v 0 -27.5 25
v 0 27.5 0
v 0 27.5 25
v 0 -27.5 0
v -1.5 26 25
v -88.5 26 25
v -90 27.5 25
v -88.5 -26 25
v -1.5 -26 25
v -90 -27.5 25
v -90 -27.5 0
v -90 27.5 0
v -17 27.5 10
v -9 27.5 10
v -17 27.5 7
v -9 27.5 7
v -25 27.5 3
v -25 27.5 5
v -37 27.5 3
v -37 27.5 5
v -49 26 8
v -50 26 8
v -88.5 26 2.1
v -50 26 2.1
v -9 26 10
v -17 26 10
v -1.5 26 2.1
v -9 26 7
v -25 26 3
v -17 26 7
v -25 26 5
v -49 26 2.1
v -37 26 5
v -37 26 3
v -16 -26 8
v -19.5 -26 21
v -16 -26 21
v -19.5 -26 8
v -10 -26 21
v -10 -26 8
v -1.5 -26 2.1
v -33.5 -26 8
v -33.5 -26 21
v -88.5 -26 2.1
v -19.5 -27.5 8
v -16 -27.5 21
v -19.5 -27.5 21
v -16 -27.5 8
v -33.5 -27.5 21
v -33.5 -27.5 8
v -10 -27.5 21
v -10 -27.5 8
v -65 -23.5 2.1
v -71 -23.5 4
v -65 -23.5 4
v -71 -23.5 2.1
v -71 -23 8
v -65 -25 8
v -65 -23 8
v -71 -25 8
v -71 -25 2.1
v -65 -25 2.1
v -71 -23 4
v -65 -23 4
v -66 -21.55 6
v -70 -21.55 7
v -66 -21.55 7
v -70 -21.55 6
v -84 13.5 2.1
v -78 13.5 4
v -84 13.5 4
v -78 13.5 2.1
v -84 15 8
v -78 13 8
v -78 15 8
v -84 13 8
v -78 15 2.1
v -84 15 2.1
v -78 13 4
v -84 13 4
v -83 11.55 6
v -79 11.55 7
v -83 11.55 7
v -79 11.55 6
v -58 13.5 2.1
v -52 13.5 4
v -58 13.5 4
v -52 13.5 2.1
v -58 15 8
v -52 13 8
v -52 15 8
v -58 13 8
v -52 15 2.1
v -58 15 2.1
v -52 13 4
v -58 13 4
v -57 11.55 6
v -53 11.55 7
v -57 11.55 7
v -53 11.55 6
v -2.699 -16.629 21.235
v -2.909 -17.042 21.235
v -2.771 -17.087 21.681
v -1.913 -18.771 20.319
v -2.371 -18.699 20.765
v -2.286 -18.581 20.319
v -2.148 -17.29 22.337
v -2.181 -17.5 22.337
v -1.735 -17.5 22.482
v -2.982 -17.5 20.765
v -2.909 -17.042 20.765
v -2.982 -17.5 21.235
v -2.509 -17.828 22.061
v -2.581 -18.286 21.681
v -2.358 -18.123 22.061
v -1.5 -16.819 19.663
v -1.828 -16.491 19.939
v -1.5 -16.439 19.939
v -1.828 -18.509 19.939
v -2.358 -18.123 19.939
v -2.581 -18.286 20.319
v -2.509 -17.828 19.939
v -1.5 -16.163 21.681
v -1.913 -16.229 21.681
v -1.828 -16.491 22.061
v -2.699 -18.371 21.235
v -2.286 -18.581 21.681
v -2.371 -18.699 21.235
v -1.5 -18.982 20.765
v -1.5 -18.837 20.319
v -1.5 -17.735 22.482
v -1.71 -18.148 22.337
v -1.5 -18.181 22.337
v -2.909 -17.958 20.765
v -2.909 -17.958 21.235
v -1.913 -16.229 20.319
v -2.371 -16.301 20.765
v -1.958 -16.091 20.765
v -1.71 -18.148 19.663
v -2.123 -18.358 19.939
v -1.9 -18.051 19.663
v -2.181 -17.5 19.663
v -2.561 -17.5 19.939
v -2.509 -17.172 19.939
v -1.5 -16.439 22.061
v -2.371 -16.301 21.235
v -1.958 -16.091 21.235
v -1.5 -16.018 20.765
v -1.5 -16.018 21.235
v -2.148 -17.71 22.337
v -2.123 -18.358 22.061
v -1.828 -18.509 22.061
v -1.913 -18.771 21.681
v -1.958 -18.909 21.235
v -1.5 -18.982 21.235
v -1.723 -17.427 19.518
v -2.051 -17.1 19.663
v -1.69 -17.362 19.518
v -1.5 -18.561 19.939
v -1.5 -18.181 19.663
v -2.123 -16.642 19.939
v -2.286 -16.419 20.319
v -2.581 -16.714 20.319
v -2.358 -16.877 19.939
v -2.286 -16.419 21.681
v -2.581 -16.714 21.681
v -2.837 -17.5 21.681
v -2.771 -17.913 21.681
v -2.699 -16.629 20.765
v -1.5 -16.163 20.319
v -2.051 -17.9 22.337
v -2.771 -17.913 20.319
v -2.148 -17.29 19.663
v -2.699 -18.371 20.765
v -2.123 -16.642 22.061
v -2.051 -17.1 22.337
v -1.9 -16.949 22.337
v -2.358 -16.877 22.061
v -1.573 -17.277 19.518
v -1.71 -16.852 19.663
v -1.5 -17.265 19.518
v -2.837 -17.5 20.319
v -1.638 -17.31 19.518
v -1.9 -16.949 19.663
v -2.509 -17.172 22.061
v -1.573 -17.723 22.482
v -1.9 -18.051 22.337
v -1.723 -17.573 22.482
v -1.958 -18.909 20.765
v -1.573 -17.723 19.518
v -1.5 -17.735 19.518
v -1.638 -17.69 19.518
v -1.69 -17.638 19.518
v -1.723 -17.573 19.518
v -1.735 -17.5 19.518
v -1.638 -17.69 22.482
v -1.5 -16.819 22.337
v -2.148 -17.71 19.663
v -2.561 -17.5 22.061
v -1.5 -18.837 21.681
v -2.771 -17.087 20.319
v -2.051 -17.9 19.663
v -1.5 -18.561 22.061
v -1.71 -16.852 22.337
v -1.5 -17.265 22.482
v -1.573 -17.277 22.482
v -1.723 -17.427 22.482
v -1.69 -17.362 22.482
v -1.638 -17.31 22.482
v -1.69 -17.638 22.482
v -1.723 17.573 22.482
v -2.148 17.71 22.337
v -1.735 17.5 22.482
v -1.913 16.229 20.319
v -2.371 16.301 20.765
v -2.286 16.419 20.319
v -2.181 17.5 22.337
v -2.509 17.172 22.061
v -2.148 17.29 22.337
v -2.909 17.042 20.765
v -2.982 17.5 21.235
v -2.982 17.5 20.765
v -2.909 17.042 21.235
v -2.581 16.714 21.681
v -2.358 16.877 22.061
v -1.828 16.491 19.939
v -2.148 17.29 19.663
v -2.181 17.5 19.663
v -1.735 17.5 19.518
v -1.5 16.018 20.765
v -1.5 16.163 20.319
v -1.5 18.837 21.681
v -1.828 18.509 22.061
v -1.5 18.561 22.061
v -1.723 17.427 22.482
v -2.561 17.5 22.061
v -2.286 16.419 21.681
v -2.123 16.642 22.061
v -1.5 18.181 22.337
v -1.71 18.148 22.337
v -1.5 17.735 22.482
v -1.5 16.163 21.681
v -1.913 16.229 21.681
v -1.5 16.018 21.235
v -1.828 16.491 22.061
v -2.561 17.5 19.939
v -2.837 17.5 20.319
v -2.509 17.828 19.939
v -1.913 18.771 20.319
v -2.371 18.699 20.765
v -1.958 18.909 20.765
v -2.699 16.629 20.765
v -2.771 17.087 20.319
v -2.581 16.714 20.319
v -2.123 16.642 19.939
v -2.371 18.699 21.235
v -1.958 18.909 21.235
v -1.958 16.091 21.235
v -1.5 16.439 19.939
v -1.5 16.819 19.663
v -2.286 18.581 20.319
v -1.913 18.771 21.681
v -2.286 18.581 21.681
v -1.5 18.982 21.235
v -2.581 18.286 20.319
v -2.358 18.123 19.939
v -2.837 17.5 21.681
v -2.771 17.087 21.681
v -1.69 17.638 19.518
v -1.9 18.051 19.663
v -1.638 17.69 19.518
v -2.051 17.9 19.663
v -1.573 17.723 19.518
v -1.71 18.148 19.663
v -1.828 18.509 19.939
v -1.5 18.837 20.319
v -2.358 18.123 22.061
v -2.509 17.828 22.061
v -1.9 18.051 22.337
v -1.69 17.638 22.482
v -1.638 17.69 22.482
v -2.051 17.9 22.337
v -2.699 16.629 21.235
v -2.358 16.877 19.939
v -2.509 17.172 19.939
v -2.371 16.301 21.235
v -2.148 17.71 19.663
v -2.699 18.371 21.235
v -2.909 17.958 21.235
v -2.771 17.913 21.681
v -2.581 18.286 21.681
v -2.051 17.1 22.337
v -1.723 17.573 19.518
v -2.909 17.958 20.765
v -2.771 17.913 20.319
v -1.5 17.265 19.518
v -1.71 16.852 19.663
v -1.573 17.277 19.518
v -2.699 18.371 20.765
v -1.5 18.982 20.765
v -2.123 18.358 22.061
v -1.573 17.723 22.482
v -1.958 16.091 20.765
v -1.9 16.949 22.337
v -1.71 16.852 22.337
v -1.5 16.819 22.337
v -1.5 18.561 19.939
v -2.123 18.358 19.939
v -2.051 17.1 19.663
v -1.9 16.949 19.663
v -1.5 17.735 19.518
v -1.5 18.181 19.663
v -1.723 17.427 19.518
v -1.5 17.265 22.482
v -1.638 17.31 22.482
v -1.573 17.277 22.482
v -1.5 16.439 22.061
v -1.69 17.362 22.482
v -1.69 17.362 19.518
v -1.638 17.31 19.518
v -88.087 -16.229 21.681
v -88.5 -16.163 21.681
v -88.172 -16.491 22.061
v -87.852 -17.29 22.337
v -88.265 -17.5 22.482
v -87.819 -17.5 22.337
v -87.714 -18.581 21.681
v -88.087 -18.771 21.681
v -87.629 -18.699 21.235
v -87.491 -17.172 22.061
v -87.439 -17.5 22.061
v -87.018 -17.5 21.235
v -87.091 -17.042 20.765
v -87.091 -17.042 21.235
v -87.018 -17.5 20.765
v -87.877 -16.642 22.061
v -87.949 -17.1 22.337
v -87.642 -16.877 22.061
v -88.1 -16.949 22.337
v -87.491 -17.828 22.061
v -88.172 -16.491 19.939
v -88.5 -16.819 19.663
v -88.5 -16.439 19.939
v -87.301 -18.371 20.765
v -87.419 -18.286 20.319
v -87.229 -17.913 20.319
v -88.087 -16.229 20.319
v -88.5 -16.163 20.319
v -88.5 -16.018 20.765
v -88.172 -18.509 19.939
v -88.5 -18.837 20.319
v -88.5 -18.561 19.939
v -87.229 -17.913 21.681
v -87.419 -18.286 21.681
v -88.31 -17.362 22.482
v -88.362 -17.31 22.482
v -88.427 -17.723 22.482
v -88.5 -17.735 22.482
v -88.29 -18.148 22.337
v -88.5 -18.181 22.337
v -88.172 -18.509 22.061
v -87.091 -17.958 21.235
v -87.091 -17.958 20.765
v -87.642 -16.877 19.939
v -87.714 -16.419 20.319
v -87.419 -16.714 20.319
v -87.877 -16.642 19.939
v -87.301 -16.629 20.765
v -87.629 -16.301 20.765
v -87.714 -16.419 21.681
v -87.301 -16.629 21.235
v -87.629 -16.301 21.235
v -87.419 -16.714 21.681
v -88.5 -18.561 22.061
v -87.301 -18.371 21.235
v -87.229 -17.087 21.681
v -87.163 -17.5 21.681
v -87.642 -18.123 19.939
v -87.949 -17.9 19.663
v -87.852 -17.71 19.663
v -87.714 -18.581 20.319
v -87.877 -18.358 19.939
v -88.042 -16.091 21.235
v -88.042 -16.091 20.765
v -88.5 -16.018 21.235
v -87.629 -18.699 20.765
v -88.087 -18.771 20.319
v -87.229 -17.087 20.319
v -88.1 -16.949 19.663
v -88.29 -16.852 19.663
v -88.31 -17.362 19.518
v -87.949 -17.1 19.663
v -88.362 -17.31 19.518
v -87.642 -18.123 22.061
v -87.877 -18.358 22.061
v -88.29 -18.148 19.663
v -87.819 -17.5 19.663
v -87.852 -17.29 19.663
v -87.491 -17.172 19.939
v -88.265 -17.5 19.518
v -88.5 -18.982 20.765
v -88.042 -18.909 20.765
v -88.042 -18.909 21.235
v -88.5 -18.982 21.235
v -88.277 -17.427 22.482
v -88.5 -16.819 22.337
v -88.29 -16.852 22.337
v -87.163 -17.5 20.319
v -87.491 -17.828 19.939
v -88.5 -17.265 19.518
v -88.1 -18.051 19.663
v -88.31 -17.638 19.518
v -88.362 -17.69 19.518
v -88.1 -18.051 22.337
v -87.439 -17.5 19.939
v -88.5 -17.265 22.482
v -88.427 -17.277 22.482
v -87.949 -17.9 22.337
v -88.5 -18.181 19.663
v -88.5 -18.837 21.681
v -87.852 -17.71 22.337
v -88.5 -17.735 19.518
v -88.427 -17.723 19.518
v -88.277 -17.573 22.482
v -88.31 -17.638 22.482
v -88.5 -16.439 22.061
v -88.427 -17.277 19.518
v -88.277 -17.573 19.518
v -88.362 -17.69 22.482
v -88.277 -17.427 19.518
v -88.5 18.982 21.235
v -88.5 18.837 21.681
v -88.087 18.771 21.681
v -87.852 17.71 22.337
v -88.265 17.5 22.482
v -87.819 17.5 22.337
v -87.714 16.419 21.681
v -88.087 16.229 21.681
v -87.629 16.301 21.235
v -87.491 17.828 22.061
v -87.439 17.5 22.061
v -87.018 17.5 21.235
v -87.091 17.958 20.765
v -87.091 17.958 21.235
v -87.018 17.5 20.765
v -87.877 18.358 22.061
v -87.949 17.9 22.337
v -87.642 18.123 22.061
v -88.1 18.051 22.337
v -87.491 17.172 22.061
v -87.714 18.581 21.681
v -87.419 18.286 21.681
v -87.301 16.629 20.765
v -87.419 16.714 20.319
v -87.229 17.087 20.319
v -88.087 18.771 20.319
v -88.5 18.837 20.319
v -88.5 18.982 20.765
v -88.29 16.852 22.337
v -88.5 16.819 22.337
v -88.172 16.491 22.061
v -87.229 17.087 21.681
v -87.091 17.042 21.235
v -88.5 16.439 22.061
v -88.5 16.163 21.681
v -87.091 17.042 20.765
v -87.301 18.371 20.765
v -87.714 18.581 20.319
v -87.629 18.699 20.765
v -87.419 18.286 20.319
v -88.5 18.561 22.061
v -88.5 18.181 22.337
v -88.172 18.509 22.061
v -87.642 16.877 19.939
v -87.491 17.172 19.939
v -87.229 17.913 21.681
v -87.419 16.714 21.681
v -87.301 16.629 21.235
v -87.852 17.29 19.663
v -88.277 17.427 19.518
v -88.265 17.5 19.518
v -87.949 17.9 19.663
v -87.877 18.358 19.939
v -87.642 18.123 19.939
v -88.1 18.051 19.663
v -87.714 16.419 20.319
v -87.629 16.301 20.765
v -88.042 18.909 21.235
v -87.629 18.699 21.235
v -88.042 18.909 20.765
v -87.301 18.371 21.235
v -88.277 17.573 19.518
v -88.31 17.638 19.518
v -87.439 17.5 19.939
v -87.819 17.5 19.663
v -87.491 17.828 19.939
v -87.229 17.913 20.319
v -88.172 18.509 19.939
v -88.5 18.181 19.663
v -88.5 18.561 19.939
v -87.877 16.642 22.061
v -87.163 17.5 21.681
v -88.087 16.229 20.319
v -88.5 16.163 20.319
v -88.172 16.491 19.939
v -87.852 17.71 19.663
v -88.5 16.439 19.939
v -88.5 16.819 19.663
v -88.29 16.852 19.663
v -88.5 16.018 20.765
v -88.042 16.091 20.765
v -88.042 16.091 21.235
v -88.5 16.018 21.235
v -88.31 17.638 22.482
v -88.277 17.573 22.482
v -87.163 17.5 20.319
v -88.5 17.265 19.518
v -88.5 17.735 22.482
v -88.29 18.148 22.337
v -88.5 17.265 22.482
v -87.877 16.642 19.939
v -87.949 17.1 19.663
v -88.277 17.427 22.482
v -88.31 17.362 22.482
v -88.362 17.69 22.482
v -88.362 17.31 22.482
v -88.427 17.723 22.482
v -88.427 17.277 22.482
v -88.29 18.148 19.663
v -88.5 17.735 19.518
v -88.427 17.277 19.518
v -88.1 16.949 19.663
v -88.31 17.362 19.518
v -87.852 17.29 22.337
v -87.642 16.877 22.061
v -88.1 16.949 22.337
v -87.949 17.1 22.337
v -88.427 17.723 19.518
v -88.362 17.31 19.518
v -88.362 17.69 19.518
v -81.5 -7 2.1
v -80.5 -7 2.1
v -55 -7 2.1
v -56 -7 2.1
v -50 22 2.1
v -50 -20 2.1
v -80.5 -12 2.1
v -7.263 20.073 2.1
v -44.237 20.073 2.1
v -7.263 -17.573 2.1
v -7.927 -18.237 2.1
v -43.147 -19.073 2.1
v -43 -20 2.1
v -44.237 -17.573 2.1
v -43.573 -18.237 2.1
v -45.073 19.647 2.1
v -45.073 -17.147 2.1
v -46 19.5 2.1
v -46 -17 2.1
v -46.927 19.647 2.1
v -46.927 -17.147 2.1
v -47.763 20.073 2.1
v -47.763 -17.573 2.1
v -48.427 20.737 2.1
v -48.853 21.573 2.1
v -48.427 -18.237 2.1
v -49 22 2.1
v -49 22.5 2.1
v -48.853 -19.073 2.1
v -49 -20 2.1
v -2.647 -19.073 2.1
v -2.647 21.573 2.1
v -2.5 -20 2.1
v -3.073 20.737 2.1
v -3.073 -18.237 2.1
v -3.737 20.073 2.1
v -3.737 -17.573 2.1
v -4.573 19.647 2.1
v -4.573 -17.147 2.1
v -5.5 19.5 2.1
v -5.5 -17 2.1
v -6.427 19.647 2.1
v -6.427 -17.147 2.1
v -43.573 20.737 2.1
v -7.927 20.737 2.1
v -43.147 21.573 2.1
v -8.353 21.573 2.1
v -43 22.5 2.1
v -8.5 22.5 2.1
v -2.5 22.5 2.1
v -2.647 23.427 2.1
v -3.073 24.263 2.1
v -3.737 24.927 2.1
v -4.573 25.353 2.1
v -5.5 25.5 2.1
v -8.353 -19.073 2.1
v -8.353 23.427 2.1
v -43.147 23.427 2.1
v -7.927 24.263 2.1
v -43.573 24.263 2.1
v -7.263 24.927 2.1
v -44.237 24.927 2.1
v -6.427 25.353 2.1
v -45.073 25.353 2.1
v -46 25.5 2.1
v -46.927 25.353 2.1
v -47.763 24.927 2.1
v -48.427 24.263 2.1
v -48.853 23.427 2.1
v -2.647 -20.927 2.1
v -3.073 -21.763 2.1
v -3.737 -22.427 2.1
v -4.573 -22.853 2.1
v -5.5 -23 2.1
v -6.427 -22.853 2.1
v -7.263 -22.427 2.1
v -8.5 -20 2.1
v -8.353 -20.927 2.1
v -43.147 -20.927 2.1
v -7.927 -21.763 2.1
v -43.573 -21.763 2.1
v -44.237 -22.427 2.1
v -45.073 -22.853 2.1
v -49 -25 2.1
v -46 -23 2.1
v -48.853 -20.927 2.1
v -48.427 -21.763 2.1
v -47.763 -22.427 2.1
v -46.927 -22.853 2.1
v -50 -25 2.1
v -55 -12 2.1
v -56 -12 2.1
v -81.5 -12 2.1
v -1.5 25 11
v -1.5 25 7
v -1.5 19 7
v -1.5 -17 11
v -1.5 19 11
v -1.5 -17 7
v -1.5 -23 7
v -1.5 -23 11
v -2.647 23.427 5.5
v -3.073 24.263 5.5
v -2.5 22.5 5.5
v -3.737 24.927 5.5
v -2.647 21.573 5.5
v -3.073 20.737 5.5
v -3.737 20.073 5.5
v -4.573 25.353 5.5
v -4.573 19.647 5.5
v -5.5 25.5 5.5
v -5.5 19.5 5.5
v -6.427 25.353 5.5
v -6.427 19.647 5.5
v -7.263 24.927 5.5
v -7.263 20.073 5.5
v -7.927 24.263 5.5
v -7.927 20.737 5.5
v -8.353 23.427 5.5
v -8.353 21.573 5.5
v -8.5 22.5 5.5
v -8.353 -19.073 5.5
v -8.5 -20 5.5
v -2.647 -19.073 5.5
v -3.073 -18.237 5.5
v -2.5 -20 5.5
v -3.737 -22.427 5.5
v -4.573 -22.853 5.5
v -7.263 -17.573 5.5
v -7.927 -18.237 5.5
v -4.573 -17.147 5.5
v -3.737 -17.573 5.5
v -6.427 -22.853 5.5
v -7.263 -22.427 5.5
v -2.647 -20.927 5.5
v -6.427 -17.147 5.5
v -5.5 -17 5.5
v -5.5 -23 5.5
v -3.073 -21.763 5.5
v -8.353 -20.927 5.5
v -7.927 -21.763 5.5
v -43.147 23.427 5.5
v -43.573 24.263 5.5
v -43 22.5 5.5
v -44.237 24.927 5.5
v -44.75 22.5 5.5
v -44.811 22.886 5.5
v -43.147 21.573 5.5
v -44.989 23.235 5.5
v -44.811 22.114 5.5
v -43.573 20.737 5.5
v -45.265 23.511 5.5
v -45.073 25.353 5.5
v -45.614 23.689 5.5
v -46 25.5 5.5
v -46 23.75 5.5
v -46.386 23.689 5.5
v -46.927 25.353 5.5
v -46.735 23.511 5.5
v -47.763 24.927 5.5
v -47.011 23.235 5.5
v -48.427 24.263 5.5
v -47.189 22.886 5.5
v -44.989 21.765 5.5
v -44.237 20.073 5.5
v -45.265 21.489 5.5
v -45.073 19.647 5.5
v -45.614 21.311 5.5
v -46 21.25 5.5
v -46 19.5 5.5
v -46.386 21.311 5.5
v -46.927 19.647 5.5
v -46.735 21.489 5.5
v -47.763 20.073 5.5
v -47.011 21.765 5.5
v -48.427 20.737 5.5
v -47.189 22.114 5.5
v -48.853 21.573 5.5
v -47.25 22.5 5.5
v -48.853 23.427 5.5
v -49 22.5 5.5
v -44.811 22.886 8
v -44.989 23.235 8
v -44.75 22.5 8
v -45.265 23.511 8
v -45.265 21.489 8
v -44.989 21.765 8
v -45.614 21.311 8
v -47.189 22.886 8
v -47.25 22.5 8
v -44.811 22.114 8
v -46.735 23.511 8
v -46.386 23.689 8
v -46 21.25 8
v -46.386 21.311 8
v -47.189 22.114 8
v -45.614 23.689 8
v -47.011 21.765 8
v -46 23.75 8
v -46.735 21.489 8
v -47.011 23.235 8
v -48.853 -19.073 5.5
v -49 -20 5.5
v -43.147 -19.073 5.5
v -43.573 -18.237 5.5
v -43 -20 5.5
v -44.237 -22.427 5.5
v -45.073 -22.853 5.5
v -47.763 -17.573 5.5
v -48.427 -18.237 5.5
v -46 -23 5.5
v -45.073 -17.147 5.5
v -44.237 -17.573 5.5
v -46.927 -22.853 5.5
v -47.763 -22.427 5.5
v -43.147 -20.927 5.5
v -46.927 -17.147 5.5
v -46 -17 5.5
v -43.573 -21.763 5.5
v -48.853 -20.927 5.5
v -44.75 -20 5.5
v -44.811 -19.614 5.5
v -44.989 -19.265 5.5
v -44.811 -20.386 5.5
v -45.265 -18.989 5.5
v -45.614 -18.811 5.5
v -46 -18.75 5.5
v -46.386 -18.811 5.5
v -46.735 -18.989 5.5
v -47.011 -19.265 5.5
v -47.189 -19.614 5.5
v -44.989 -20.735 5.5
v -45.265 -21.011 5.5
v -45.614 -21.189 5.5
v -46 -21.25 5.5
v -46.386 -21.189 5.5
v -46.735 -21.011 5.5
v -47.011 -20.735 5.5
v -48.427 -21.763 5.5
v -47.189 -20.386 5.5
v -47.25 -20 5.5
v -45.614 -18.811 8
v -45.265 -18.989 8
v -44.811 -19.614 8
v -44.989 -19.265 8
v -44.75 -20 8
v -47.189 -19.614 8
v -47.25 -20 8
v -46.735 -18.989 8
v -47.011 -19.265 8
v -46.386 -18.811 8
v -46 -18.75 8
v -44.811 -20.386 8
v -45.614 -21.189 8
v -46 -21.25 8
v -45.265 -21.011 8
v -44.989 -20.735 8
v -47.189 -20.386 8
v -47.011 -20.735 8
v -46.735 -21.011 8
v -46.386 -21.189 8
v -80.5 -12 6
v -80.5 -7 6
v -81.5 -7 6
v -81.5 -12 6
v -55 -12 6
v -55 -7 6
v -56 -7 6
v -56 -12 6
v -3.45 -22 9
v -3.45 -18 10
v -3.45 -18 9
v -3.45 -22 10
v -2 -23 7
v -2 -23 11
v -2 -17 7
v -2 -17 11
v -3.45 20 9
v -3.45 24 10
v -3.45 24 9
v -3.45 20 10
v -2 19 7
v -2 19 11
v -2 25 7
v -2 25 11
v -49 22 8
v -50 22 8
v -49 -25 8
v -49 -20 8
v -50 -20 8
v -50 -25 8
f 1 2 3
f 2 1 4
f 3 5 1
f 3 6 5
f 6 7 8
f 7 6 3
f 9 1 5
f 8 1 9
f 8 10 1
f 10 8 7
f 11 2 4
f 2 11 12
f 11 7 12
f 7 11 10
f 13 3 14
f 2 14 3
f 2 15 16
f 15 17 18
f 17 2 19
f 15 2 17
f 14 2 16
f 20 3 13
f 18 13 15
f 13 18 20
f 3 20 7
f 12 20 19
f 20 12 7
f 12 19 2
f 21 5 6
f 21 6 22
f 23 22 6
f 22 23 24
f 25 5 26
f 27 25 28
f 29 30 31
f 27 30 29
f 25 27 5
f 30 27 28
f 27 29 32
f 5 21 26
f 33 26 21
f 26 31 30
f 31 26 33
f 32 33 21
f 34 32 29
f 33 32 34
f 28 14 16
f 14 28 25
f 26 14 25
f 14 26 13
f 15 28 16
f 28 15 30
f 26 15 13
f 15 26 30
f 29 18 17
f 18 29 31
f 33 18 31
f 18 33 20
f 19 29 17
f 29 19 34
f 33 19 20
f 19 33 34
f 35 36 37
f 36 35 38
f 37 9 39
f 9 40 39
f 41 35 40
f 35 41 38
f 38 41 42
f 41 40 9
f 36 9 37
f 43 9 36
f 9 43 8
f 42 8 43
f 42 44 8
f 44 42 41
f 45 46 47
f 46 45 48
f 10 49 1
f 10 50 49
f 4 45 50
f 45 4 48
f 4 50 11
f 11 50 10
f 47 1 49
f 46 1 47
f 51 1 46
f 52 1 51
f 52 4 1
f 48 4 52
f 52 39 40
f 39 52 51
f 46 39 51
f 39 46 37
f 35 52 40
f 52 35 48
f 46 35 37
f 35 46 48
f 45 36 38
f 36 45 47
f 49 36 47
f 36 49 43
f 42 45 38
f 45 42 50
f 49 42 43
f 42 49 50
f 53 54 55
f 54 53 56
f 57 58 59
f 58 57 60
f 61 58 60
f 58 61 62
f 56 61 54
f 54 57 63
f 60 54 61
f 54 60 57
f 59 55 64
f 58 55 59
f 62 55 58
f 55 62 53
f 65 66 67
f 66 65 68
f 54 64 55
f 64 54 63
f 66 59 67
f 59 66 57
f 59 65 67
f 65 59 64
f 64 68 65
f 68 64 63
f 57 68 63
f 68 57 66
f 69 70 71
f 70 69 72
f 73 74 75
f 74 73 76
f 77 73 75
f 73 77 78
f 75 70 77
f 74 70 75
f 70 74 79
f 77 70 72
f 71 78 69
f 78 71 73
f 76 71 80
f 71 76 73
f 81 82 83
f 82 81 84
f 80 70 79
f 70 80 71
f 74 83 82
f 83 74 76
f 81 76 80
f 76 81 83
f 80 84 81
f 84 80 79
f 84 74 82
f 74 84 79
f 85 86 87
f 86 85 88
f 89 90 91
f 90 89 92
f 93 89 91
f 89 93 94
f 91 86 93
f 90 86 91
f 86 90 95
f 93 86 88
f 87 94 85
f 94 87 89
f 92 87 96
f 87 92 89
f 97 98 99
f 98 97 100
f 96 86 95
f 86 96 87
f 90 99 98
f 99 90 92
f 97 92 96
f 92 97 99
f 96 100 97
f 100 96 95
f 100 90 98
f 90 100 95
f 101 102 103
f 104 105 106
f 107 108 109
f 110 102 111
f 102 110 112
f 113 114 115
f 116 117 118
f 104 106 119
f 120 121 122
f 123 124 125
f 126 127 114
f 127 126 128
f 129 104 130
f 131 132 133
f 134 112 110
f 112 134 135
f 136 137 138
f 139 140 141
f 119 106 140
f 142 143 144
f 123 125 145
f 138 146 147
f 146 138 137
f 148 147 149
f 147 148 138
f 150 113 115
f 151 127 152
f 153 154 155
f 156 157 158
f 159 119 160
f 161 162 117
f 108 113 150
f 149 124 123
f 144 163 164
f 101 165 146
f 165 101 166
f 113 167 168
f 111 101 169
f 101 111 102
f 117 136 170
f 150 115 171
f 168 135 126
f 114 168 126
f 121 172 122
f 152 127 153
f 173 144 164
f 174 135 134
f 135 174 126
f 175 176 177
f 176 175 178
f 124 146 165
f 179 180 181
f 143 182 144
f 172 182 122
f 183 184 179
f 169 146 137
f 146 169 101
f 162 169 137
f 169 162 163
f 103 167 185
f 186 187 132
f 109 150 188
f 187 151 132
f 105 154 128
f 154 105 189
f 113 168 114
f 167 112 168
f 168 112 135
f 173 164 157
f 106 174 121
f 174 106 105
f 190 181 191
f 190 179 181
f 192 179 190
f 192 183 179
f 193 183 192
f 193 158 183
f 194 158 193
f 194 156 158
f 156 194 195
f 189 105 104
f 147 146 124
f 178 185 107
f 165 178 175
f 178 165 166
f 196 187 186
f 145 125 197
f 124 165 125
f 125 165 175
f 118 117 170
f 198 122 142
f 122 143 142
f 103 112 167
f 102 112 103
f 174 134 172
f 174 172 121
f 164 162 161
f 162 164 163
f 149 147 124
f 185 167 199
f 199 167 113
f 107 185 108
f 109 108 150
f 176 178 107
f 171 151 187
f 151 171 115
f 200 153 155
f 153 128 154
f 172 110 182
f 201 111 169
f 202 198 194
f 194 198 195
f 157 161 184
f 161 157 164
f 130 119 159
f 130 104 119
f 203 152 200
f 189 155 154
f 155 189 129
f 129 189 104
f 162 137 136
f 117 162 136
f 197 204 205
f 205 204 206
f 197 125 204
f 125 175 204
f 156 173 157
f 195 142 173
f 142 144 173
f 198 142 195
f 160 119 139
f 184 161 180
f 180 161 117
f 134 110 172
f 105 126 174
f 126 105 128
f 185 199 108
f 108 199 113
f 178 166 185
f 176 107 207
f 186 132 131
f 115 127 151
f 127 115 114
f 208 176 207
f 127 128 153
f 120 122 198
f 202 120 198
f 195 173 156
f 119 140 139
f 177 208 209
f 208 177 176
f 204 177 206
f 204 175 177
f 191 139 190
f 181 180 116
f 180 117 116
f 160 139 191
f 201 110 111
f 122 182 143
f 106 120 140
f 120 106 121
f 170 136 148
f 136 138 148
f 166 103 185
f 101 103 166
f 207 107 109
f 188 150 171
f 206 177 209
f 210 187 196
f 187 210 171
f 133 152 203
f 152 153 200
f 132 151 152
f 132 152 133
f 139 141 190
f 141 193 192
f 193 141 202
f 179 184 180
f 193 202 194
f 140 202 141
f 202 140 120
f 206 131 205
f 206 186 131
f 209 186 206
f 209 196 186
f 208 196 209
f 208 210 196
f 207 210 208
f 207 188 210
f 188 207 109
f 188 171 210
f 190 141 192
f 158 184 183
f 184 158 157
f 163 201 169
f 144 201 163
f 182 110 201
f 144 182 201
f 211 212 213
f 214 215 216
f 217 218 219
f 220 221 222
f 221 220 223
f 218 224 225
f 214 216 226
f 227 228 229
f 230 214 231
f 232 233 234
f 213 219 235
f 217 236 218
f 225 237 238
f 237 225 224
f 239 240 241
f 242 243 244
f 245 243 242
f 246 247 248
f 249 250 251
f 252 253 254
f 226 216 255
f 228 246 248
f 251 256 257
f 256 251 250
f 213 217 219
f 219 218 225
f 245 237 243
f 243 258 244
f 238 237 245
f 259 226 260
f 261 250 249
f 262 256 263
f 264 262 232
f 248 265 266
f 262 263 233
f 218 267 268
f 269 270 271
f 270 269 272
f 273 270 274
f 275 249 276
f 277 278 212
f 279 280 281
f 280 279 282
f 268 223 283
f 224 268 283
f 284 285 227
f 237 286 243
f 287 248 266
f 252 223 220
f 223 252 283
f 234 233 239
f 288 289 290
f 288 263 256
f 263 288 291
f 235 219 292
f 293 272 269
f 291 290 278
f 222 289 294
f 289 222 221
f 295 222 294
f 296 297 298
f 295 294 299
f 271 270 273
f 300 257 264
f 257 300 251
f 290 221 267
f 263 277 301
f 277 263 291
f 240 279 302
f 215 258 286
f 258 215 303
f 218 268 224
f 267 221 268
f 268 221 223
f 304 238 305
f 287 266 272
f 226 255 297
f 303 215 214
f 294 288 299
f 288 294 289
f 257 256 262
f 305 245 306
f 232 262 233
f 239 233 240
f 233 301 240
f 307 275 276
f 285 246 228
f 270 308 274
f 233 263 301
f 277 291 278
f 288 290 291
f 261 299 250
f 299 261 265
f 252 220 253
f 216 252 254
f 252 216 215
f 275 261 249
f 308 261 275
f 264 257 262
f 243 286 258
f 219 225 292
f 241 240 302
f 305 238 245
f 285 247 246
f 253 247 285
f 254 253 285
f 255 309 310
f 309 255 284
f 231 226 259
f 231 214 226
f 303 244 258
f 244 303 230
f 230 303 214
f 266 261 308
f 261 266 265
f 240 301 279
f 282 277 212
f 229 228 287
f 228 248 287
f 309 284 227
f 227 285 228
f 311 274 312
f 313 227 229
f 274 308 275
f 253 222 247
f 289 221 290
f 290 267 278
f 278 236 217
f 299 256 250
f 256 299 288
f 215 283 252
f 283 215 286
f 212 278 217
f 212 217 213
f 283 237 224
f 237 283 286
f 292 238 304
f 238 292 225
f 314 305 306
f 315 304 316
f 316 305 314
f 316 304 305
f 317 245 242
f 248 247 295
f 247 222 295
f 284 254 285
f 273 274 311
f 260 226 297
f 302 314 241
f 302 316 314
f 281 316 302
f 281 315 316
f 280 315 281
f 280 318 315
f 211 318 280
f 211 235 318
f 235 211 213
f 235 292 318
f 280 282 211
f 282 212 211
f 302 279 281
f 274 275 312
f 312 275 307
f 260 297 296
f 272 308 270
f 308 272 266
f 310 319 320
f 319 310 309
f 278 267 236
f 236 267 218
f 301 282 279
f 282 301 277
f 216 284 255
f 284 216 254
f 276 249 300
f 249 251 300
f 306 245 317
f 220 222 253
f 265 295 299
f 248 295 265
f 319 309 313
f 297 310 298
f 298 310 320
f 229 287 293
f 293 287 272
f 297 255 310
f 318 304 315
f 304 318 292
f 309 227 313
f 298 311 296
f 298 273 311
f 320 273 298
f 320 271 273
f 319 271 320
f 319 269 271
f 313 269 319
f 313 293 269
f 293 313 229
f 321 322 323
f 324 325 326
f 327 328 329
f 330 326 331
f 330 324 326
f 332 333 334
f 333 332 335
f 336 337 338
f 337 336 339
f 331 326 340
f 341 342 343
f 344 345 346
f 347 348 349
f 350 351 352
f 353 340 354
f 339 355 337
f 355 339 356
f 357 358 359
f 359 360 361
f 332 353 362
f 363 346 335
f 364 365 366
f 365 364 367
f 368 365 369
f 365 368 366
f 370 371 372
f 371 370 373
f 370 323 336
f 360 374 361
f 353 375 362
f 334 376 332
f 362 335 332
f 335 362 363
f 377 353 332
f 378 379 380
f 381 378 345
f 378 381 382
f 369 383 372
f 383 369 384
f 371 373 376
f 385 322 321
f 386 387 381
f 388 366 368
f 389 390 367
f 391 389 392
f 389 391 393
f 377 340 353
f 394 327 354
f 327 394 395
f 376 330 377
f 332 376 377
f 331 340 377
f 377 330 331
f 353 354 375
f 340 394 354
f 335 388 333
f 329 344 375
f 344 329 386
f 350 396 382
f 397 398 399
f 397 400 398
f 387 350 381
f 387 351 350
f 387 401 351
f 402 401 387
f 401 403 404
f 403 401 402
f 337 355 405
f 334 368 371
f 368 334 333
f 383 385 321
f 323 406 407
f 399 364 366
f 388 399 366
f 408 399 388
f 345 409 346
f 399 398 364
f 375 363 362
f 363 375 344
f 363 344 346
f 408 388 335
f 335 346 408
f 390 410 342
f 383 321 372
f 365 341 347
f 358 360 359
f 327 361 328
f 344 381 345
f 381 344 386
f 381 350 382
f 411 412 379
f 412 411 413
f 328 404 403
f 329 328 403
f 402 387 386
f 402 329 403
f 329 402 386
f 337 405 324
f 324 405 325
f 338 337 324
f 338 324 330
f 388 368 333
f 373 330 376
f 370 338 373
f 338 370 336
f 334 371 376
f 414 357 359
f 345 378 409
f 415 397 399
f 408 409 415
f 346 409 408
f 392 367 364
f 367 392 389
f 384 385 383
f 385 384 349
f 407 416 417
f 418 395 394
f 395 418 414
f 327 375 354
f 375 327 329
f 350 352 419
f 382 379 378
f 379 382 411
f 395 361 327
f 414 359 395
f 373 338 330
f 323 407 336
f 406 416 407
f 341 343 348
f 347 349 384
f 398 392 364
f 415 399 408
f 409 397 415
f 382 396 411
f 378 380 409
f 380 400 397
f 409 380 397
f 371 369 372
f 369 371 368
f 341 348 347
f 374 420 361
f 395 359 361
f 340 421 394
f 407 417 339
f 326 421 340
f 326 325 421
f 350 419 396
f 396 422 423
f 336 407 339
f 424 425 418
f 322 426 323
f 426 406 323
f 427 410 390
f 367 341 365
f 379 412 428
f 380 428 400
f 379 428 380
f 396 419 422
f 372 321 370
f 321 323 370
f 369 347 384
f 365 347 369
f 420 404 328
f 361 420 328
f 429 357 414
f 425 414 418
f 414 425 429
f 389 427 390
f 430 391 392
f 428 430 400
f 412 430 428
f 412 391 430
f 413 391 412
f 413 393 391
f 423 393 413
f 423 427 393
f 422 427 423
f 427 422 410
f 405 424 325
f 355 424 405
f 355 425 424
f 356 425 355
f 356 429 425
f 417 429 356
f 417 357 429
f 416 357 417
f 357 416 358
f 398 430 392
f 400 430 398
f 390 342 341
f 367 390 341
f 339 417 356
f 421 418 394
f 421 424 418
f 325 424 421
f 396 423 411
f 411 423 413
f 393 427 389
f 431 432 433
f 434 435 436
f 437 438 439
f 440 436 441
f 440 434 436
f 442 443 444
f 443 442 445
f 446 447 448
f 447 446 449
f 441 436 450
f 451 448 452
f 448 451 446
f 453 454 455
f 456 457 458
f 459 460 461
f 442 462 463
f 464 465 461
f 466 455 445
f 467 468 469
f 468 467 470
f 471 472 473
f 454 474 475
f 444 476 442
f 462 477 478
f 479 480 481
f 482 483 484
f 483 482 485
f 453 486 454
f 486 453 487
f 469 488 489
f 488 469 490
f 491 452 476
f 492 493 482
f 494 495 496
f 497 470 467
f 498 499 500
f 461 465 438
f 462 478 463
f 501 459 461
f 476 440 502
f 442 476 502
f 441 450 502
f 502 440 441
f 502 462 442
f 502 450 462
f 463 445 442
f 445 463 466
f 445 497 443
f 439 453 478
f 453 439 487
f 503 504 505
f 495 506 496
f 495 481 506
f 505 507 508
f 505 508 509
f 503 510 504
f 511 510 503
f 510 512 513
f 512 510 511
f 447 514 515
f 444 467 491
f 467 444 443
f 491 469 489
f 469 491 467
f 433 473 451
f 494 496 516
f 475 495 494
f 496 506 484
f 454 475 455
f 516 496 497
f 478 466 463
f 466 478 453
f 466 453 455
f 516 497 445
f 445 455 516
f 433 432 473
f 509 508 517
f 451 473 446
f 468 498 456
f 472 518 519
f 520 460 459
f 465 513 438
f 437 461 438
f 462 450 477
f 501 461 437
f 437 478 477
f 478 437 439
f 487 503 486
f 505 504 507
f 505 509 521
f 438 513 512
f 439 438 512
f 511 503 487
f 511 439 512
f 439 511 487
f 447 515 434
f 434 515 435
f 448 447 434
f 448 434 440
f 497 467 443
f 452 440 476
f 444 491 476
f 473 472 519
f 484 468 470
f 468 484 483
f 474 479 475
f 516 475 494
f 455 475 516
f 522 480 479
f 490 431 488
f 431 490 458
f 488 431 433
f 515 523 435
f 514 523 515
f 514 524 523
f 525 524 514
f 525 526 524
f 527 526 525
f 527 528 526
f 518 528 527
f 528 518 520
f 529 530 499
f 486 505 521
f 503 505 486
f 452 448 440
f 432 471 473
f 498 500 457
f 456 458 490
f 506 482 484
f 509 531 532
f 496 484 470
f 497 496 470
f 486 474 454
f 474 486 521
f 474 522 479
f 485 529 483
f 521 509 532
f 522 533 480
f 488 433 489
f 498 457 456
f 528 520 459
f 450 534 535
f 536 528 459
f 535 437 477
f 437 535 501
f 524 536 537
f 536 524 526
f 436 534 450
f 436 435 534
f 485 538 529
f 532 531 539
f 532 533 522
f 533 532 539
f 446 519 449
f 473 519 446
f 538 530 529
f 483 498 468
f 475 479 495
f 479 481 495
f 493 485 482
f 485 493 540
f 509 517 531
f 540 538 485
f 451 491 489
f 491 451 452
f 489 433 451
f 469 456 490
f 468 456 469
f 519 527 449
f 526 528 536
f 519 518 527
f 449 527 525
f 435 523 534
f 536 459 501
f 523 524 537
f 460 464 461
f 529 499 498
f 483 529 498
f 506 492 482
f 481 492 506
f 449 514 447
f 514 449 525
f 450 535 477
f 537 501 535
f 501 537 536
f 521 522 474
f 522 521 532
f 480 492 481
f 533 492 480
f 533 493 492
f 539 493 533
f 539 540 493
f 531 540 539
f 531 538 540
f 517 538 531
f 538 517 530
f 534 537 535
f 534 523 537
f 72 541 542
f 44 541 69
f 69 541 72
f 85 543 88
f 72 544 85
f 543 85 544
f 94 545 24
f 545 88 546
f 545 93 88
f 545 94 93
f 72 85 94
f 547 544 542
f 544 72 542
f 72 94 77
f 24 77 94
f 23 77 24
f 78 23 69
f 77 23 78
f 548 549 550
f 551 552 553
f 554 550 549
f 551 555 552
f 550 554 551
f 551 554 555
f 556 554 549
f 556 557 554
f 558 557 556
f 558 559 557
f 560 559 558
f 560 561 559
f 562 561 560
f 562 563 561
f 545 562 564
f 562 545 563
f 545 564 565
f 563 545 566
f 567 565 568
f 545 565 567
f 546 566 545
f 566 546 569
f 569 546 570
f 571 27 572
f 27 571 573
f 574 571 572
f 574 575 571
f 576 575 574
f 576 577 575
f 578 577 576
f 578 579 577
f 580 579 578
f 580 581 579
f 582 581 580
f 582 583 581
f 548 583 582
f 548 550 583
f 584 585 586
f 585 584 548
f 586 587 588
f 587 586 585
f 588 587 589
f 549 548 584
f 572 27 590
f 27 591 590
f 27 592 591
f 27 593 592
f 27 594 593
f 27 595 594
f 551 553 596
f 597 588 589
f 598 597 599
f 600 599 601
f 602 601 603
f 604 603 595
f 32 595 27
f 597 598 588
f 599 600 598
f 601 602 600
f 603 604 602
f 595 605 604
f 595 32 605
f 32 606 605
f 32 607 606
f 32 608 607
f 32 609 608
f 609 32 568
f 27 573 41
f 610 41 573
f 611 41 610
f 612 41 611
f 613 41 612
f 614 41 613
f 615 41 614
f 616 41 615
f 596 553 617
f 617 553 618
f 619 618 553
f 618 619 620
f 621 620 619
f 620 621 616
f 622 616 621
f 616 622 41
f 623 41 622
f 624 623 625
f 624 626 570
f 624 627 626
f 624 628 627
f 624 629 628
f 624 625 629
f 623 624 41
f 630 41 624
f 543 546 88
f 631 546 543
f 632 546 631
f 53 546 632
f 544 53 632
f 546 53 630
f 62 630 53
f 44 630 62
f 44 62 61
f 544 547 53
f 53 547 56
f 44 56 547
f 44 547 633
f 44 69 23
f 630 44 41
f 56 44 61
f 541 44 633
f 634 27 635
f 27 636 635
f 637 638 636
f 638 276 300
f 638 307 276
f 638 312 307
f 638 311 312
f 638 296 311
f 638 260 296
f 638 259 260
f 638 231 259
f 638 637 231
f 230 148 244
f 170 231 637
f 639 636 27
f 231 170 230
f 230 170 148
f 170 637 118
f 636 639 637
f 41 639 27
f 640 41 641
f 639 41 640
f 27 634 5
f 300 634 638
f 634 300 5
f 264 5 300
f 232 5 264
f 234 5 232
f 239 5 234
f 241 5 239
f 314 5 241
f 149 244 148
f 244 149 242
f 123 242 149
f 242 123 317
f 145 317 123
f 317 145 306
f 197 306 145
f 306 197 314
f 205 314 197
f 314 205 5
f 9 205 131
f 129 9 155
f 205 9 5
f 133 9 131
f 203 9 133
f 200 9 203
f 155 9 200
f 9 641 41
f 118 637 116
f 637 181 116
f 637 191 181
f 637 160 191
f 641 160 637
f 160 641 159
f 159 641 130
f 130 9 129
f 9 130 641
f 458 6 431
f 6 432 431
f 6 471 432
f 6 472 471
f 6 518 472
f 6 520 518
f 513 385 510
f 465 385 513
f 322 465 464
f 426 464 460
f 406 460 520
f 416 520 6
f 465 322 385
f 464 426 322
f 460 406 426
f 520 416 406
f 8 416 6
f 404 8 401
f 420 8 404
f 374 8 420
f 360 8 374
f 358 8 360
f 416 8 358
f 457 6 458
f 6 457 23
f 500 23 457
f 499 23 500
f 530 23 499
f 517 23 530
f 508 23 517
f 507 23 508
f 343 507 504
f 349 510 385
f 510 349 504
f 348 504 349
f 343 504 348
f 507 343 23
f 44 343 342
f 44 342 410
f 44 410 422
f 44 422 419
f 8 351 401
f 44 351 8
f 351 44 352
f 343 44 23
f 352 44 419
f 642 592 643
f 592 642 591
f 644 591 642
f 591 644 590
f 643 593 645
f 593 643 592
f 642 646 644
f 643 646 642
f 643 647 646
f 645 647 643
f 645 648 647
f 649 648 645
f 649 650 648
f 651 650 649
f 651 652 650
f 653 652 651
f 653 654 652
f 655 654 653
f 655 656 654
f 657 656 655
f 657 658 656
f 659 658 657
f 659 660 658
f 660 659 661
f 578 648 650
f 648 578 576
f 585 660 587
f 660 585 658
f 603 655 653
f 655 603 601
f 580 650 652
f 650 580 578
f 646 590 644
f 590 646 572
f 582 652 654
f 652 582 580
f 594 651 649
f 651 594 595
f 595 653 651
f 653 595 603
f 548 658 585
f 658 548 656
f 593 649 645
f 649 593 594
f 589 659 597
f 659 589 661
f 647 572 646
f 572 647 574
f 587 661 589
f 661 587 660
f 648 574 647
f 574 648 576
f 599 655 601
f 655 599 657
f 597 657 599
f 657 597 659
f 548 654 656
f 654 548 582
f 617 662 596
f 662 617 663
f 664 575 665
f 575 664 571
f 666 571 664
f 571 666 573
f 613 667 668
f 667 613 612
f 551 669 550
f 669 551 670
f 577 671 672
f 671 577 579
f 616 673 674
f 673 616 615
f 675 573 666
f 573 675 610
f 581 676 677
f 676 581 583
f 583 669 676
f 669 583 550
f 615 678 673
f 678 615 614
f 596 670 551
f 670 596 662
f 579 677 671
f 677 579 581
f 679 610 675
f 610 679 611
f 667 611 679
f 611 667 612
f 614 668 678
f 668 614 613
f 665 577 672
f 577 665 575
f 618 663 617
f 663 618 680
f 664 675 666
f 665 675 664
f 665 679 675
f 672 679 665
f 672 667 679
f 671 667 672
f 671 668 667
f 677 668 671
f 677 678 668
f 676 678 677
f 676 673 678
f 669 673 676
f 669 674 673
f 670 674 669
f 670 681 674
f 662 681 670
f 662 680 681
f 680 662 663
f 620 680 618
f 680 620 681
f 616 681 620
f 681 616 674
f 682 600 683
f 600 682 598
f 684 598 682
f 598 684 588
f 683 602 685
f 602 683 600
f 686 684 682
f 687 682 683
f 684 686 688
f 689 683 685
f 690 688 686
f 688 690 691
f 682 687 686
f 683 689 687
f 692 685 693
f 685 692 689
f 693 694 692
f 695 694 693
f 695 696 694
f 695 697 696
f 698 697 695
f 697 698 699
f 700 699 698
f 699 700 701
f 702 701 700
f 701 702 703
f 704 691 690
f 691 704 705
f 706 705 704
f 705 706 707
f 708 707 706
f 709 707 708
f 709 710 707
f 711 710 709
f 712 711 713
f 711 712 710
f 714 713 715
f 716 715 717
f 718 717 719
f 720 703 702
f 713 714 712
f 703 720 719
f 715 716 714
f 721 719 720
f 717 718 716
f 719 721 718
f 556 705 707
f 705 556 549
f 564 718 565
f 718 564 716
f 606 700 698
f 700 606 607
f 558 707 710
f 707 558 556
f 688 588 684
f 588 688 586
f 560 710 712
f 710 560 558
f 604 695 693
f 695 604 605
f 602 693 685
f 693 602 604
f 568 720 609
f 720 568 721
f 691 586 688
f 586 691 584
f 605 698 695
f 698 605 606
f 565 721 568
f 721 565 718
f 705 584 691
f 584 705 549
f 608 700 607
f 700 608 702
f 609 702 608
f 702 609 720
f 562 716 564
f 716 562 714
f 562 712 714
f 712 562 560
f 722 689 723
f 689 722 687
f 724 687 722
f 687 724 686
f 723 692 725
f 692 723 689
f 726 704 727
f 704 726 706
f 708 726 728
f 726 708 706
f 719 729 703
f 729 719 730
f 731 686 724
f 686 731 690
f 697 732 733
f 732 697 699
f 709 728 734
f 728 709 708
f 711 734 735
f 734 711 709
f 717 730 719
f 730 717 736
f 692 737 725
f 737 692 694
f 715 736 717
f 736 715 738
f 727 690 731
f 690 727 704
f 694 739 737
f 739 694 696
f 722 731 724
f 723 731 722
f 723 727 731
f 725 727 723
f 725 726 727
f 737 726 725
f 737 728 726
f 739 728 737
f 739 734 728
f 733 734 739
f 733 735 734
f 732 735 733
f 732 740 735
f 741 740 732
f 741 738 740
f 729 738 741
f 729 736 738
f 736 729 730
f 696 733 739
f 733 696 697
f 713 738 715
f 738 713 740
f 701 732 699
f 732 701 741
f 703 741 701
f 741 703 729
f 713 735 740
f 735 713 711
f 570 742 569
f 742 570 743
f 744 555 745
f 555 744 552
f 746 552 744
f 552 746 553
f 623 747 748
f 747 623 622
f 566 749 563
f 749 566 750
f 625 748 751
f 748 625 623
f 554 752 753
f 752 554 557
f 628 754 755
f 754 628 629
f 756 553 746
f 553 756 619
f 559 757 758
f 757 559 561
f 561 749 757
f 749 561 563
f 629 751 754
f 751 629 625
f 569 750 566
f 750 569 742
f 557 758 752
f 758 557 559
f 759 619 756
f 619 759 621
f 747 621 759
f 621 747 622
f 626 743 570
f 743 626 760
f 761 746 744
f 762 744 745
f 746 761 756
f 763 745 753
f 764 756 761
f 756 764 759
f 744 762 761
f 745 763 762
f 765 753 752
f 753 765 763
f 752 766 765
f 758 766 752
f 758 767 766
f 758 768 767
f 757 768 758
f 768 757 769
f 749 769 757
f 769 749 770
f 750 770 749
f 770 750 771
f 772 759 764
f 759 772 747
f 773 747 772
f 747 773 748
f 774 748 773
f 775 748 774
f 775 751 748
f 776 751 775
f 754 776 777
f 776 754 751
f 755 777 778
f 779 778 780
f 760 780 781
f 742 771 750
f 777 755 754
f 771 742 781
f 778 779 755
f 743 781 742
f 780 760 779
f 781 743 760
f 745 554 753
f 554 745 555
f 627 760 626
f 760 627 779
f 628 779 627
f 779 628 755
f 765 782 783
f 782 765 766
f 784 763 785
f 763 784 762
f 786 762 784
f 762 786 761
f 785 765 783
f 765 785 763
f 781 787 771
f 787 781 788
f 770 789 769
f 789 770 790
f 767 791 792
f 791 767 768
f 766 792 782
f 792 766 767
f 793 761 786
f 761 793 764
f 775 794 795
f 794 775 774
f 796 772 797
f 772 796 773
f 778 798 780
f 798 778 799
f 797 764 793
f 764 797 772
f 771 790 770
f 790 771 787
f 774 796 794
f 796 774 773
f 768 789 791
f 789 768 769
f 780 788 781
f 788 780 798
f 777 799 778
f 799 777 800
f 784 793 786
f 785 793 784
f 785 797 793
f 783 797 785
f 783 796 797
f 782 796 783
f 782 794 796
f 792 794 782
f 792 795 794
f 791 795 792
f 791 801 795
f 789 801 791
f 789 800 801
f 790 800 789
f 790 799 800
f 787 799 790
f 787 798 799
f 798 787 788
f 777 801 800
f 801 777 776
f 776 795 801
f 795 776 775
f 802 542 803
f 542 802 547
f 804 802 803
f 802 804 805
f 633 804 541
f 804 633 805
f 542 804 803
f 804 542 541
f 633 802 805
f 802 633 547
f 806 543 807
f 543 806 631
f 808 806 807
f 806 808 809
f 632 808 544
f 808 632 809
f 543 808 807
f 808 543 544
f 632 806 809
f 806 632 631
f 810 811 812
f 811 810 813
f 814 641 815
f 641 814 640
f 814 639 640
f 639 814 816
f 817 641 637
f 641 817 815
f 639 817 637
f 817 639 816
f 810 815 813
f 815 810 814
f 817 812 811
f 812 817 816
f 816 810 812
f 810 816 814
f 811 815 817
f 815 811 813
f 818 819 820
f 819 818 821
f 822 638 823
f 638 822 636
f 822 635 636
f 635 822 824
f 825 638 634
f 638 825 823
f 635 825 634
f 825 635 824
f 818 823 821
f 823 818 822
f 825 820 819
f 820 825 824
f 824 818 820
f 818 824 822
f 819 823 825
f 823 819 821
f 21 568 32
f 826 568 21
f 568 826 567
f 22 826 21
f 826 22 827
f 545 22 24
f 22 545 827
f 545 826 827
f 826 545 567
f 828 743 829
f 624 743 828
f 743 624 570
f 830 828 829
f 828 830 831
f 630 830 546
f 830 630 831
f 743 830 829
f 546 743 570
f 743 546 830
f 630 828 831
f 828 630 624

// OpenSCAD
// Startpoint Router ground:

le=90;
br=55;
hr=25;

module usb_eth(){
    difference() {
        translate([0-le,-br/2,0])cube([le,1.5,hr]);
        translate([0-16,-br/2-0.5,8])cube([6,3,13]);        
        translate([0-14.5-19,-br/2-0.5,8])cube([14,3,13]);        
    }
 }

module usb_sdcard(){
    difference() {
        translate([0-le,br/2-1.5,0])cube([le,1.5,hr]);
        translate([0-8-9,br/2-2,7])cube([8,3,3]);        
        translate([0-12-25,br/2-2,3])cube([12,3,2]);        
    }
}

module merkur_snap() {
        cube([1.5,6,6]);
    hull(){
        translate([0,0,2])cube([2,6,4]);
        translate([1,1,4])cube([2.45,4,1]);
    }
}

module orange_snap() {
    hull(){
        translate([0,0,2])cube([2,6,4]);
        translate([1,1,4])cube([2.45,4,1]);
    }
}

module holders(){
   translate([0-1.5,-br/2+10,hr-4])sphere (d=3);
   translate([0-1.5,+br/2-10,hr-4])sphere (d=3);
   translate([0-le+1.5,-br/2+10,hr-4])sphere (d=3);
   translate([0-le+1.5,+br/2-10,hr-4])sphere (d=3);
}
union(){
     translate ([-le,-br/2,0])cube([le, br,2.1]);
     translate([0-1.5,-br/2,0])rotate([0,-0,0])cube([1.5,br,hr]);
     translate([0-le,-br/2,0])rotate([0,0,0])cube([1.5,br,hr]);

     usb_sdcard();
     usb_eth();
    
    $fn=20;
    translate([-5.5,22.5,3])cylinder(5, 3, 3, center=true);
    // translate([-5.5,22.5,4])cylinder(8, 1.25, 1.25, center=true);

    translate([-5.5,-20,3])cylinder(5, 3, 3, center=true);
    //translate([-5.5,-20,4])cylinder(8, 1.25, 1.25, center=true);

    translate([-5-41,22.5,3])cylinder(5, 3, 3, center=true);
    translate([-5-41,22.5,4])cylinder(8, 1.25, 1.25, center=true);

    translate([-5-41,-20,3])cylinder(5, 3, 3, center=true);
    translate([-5-41,-20,4])cylinder(8, 1.25, 1.25, center=true);

   translate([-81.5,-12,0])rotate([0,0,0])cube([1,5,6]);
   translate([-81+25,-12,0])rotate([0,0,0])cube([1,5,6]);
   translate([-65,-25,2])rotate([0,0,90])merkur_snap();
   translate([-78-6,15,2])rotate([0,0,-90])merkur_snap();
   translate([-52-6,15,2])rotate([0,0,-90])merkur_snap();
 
   translate([0,-17,5])rotate([0,0,180])orange_snap();
   translate([0,25,5])rotate([0,0,180])orange_snap();
   translate([-50,22,0])rotate([0,0,0])cube([1,5,8]);
   translate([-50,-25,0])rotate([0,0,0])cube([1,5,8]);

   holders();
 }
